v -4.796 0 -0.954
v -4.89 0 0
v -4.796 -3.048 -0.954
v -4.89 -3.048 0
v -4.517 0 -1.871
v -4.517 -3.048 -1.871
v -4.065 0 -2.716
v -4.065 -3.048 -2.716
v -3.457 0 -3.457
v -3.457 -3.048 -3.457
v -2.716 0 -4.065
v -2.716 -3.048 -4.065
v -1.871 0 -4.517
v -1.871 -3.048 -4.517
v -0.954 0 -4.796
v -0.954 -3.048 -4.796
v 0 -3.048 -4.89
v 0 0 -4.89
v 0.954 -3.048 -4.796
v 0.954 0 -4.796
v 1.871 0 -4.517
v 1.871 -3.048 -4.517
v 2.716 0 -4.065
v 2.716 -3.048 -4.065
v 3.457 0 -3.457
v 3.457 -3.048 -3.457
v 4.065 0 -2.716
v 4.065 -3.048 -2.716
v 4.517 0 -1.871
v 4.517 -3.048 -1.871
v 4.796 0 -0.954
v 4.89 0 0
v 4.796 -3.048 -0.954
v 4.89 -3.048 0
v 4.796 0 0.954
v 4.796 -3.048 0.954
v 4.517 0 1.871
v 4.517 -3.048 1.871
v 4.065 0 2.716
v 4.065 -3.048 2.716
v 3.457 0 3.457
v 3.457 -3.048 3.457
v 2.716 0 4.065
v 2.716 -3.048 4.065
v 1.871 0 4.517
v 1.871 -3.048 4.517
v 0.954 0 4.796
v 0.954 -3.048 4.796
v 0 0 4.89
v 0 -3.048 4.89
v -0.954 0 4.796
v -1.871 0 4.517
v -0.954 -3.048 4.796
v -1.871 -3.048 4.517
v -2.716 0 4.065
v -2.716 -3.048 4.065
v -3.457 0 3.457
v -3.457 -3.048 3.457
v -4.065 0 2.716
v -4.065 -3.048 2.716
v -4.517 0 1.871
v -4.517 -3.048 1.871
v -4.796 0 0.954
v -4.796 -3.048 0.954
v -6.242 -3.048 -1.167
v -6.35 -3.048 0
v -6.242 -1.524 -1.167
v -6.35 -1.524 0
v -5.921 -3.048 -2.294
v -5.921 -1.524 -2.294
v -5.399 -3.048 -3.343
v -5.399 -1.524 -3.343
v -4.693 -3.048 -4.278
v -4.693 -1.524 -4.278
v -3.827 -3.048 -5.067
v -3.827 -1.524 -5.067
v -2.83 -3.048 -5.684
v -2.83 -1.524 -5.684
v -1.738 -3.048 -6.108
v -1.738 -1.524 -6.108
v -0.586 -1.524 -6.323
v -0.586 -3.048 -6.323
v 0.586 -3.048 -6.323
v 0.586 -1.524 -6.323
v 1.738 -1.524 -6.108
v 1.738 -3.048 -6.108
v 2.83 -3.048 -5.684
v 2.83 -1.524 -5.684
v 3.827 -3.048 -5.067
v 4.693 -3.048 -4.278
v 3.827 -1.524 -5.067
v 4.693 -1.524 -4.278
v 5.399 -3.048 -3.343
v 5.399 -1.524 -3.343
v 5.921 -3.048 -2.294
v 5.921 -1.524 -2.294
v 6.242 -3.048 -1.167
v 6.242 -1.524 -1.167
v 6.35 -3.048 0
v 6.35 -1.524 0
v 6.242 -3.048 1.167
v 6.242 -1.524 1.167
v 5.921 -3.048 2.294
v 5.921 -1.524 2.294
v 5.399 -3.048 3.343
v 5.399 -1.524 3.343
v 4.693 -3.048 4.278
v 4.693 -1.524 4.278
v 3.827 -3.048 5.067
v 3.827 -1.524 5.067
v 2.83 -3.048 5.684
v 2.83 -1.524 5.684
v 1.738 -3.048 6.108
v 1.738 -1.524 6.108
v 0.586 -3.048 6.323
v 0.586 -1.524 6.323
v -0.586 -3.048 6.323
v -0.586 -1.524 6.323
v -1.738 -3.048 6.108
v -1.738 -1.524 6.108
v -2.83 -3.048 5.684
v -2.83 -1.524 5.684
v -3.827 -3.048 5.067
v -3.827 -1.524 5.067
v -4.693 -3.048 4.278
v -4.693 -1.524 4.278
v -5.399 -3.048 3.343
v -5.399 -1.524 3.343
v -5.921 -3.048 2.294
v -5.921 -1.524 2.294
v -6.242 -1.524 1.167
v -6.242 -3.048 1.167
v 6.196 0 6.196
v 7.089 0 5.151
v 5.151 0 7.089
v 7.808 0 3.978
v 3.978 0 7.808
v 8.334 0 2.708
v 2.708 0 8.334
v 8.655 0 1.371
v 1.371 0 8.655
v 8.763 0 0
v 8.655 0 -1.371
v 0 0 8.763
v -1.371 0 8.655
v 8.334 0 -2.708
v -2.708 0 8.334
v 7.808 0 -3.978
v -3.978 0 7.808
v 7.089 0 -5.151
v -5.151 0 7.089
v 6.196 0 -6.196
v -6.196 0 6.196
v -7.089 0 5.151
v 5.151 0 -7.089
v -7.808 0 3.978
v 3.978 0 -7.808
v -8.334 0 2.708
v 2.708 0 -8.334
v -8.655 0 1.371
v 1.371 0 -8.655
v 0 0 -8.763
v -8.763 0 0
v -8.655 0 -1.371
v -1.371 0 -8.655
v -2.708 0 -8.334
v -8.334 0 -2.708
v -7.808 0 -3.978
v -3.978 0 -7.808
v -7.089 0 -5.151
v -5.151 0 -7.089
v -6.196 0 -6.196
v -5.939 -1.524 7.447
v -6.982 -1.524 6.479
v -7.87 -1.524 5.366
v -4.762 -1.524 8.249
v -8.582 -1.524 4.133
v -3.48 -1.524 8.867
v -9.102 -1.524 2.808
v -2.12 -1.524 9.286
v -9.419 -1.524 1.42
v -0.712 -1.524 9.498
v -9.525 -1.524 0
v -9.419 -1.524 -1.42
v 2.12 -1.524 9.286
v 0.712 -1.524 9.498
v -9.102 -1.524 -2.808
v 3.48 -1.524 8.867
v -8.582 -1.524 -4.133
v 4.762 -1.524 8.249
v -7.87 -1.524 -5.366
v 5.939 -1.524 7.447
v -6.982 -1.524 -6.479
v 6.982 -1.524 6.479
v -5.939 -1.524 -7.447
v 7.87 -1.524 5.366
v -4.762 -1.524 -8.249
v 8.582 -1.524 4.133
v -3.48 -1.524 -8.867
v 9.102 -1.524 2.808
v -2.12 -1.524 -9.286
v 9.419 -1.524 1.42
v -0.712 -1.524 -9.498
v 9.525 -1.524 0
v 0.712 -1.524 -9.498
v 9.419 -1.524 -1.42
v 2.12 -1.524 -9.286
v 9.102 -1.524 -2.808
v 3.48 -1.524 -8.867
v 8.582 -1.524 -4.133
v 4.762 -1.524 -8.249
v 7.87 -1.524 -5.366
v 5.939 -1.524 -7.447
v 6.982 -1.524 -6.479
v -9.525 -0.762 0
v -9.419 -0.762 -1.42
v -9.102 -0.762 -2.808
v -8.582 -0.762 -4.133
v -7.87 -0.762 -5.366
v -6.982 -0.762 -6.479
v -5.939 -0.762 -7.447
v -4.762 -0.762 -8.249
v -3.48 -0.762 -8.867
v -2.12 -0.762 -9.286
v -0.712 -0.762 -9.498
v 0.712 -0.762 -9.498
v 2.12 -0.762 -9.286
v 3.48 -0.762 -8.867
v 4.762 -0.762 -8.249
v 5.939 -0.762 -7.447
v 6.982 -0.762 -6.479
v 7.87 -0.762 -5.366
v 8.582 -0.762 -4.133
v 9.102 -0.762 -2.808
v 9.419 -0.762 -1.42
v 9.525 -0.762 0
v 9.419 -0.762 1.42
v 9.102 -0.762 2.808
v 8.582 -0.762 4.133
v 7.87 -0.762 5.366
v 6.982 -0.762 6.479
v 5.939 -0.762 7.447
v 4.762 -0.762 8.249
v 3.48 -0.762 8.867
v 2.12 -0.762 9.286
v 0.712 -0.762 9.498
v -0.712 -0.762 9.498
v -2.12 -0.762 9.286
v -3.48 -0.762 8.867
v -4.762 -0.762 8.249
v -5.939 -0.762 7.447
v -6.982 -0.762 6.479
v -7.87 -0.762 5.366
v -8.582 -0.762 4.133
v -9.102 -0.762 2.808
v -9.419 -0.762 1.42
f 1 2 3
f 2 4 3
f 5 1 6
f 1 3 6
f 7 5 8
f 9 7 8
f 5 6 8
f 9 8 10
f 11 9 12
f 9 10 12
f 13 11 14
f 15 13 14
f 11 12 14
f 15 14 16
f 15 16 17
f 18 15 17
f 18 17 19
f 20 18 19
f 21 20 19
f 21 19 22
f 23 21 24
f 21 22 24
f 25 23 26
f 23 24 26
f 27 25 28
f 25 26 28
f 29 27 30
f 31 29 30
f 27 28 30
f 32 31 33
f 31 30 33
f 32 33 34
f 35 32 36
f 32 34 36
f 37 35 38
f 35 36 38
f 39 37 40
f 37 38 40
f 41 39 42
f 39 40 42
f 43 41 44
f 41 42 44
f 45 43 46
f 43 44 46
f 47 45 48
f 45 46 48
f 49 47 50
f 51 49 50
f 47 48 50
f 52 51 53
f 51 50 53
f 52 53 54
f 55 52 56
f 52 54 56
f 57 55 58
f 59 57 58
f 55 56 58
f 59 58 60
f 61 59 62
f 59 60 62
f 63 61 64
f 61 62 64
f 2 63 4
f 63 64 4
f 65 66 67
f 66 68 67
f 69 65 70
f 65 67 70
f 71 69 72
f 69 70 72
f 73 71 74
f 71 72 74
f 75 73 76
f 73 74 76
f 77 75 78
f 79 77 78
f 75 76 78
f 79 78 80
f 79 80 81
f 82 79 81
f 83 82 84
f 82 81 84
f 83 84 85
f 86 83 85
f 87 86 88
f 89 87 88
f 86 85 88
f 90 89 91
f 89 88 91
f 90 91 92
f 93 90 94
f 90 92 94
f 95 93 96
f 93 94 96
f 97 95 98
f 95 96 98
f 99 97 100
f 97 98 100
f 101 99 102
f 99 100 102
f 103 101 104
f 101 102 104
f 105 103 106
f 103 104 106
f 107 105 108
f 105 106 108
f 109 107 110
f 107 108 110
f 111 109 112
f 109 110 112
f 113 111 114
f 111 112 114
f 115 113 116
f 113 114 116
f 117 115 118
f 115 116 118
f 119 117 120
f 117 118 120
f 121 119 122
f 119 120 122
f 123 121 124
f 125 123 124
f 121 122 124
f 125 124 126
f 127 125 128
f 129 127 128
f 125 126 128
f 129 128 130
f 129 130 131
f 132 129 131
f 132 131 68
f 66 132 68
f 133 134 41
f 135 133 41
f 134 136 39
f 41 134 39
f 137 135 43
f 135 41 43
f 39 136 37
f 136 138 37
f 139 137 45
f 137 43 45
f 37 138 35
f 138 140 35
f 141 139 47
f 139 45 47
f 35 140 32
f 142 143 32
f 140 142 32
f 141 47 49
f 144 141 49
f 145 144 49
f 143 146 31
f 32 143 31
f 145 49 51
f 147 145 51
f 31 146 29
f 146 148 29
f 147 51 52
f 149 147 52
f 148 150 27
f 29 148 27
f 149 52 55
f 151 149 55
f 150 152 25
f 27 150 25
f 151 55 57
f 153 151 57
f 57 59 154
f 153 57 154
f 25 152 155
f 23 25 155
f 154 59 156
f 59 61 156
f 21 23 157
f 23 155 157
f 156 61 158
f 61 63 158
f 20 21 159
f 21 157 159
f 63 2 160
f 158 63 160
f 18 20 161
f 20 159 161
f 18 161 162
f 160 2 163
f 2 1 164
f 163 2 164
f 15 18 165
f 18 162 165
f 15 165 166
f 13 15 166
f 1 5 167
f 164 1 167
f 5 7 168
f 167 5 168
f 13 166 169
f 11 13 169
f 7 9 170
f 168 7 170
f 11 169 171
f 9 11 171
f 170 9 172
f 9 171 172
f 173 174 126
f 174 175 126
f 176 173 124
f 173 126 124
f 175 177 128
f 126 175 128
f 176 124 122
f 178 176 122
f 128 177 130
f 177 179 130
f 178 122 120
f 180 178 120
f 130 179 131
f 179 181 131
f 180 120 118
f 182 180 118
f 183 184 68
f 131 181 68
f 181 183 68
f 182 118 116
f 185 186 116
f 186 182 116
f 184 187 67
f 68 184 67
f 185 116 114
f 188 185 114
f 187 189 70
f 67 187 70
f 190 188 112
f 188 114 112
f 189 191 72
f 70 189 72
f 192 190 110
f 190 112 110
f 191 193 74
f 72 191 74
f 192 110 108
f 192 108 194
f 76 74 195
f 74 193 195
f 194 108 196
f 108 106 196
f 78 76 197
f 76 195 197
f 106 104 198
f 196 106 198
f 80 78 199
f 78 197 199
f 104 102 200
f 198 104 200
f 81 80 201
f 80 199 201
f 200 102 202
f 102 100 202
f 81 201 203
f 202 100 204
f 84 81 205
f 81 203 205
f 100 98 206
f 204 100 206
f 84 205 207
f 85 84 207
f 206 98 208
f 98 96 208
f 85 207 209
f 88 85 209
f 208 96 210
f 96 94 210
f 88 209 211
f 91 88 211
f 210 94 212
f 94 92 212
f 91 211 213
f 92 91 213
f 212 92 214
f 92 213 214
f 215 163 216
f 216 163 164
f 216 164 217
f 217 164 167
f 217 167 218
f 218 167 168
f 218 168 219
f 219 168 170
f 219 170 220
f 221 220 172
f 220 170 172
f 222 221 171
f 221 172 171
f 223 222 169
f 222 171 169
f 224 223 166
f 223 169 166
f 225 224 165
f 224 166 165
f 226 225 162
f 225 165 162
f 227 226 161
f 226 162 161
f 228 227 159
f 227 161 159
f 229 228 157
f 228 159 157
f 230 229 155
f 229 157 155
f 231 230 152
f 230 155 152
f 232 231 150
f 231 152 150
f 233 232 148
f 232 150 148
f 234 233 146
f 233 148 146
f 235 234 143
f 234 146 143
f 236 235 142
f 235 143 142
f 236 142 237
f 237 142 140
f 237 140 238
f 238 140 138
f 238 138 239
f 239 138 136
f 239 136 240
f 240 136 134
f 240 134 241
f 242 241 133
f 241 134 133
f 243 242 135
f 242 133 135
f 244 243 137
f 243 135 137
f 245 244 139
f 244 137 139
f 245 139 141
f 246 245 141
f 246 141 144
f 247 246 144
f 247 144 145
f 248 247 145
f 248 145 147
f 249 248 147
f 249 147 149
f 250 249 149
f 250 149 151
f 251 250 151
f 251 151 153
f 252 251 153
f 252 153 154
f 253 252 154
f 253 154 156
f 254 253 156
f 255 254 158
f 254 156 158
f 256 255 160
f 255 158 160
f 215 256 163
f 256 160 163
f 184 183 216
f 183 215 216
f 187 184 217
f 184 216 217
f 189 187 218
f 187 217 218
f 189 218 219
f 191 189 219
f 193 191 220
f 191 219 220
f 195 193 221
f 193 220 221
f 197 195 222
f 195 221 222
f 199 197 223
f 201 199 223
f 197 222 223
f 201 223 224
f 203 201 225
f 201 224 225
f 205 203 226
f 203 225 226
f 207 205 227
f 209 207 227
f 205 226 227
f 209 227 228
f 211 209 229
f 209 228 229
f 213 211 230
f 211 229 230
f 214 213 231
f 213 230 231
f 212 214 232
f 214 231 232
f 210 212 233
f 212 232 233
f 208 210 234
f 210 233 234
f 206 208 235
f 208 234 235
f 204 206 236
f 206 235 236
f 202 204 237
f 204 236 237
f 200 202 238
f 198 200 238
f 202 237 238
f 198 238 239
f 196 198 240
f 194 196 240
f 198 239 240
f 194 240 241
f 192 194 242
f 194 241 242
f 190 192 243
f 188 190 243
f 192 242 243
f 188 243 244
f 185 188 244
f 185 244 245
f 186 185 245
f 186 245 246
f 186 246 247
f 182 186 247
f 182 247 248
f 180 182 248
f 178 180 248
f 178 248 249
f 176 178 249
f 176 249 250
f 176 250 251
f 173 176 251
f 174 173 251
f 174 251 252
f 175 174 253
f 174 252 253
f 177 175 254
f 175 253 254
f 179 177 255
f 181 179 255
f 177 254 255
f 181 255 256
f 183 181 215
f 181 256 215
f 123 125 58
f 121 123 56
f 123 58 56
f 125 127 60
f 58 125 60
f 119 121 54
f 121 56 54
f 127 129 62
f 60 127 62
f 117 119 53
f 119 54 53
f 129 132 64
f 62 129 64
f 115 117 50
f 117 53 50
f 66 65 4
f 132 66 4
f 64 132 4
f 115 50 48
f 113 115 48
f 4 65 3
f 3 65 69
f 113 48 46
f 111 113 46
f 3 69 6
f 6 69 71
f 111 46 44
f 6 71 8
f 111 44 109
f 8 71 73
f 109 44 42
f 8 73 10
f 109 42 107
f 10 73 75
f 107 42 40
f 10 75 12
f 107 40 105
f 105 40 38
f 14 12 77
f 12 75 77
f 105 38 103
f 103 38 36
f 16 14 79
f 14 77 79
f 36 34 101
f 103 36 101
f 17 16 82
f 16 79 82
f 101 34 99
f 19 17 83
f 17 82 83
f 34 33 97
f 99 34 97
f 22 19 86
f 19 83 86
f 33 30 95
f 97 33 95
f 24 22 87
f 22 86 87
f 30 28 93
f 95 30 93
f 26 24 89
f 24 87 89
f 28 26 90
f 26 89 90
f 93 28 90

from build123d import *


with BuildPart() as part:
    # Sketch1 → Revolve1 (revolve)
    with BuildSketch(Plane.XY):
        Polygon((-4.8895, 0), (-4.8895, -3.048), (-6.35, -3.048), (-6.35, -1.524), (-9.525, -1.524), (-9.525, -0.762), (-8.763, 0), align=None)
    revolve(axis=Axis((0, 0, 0), (0, -1, 0)))


solid = part.part
